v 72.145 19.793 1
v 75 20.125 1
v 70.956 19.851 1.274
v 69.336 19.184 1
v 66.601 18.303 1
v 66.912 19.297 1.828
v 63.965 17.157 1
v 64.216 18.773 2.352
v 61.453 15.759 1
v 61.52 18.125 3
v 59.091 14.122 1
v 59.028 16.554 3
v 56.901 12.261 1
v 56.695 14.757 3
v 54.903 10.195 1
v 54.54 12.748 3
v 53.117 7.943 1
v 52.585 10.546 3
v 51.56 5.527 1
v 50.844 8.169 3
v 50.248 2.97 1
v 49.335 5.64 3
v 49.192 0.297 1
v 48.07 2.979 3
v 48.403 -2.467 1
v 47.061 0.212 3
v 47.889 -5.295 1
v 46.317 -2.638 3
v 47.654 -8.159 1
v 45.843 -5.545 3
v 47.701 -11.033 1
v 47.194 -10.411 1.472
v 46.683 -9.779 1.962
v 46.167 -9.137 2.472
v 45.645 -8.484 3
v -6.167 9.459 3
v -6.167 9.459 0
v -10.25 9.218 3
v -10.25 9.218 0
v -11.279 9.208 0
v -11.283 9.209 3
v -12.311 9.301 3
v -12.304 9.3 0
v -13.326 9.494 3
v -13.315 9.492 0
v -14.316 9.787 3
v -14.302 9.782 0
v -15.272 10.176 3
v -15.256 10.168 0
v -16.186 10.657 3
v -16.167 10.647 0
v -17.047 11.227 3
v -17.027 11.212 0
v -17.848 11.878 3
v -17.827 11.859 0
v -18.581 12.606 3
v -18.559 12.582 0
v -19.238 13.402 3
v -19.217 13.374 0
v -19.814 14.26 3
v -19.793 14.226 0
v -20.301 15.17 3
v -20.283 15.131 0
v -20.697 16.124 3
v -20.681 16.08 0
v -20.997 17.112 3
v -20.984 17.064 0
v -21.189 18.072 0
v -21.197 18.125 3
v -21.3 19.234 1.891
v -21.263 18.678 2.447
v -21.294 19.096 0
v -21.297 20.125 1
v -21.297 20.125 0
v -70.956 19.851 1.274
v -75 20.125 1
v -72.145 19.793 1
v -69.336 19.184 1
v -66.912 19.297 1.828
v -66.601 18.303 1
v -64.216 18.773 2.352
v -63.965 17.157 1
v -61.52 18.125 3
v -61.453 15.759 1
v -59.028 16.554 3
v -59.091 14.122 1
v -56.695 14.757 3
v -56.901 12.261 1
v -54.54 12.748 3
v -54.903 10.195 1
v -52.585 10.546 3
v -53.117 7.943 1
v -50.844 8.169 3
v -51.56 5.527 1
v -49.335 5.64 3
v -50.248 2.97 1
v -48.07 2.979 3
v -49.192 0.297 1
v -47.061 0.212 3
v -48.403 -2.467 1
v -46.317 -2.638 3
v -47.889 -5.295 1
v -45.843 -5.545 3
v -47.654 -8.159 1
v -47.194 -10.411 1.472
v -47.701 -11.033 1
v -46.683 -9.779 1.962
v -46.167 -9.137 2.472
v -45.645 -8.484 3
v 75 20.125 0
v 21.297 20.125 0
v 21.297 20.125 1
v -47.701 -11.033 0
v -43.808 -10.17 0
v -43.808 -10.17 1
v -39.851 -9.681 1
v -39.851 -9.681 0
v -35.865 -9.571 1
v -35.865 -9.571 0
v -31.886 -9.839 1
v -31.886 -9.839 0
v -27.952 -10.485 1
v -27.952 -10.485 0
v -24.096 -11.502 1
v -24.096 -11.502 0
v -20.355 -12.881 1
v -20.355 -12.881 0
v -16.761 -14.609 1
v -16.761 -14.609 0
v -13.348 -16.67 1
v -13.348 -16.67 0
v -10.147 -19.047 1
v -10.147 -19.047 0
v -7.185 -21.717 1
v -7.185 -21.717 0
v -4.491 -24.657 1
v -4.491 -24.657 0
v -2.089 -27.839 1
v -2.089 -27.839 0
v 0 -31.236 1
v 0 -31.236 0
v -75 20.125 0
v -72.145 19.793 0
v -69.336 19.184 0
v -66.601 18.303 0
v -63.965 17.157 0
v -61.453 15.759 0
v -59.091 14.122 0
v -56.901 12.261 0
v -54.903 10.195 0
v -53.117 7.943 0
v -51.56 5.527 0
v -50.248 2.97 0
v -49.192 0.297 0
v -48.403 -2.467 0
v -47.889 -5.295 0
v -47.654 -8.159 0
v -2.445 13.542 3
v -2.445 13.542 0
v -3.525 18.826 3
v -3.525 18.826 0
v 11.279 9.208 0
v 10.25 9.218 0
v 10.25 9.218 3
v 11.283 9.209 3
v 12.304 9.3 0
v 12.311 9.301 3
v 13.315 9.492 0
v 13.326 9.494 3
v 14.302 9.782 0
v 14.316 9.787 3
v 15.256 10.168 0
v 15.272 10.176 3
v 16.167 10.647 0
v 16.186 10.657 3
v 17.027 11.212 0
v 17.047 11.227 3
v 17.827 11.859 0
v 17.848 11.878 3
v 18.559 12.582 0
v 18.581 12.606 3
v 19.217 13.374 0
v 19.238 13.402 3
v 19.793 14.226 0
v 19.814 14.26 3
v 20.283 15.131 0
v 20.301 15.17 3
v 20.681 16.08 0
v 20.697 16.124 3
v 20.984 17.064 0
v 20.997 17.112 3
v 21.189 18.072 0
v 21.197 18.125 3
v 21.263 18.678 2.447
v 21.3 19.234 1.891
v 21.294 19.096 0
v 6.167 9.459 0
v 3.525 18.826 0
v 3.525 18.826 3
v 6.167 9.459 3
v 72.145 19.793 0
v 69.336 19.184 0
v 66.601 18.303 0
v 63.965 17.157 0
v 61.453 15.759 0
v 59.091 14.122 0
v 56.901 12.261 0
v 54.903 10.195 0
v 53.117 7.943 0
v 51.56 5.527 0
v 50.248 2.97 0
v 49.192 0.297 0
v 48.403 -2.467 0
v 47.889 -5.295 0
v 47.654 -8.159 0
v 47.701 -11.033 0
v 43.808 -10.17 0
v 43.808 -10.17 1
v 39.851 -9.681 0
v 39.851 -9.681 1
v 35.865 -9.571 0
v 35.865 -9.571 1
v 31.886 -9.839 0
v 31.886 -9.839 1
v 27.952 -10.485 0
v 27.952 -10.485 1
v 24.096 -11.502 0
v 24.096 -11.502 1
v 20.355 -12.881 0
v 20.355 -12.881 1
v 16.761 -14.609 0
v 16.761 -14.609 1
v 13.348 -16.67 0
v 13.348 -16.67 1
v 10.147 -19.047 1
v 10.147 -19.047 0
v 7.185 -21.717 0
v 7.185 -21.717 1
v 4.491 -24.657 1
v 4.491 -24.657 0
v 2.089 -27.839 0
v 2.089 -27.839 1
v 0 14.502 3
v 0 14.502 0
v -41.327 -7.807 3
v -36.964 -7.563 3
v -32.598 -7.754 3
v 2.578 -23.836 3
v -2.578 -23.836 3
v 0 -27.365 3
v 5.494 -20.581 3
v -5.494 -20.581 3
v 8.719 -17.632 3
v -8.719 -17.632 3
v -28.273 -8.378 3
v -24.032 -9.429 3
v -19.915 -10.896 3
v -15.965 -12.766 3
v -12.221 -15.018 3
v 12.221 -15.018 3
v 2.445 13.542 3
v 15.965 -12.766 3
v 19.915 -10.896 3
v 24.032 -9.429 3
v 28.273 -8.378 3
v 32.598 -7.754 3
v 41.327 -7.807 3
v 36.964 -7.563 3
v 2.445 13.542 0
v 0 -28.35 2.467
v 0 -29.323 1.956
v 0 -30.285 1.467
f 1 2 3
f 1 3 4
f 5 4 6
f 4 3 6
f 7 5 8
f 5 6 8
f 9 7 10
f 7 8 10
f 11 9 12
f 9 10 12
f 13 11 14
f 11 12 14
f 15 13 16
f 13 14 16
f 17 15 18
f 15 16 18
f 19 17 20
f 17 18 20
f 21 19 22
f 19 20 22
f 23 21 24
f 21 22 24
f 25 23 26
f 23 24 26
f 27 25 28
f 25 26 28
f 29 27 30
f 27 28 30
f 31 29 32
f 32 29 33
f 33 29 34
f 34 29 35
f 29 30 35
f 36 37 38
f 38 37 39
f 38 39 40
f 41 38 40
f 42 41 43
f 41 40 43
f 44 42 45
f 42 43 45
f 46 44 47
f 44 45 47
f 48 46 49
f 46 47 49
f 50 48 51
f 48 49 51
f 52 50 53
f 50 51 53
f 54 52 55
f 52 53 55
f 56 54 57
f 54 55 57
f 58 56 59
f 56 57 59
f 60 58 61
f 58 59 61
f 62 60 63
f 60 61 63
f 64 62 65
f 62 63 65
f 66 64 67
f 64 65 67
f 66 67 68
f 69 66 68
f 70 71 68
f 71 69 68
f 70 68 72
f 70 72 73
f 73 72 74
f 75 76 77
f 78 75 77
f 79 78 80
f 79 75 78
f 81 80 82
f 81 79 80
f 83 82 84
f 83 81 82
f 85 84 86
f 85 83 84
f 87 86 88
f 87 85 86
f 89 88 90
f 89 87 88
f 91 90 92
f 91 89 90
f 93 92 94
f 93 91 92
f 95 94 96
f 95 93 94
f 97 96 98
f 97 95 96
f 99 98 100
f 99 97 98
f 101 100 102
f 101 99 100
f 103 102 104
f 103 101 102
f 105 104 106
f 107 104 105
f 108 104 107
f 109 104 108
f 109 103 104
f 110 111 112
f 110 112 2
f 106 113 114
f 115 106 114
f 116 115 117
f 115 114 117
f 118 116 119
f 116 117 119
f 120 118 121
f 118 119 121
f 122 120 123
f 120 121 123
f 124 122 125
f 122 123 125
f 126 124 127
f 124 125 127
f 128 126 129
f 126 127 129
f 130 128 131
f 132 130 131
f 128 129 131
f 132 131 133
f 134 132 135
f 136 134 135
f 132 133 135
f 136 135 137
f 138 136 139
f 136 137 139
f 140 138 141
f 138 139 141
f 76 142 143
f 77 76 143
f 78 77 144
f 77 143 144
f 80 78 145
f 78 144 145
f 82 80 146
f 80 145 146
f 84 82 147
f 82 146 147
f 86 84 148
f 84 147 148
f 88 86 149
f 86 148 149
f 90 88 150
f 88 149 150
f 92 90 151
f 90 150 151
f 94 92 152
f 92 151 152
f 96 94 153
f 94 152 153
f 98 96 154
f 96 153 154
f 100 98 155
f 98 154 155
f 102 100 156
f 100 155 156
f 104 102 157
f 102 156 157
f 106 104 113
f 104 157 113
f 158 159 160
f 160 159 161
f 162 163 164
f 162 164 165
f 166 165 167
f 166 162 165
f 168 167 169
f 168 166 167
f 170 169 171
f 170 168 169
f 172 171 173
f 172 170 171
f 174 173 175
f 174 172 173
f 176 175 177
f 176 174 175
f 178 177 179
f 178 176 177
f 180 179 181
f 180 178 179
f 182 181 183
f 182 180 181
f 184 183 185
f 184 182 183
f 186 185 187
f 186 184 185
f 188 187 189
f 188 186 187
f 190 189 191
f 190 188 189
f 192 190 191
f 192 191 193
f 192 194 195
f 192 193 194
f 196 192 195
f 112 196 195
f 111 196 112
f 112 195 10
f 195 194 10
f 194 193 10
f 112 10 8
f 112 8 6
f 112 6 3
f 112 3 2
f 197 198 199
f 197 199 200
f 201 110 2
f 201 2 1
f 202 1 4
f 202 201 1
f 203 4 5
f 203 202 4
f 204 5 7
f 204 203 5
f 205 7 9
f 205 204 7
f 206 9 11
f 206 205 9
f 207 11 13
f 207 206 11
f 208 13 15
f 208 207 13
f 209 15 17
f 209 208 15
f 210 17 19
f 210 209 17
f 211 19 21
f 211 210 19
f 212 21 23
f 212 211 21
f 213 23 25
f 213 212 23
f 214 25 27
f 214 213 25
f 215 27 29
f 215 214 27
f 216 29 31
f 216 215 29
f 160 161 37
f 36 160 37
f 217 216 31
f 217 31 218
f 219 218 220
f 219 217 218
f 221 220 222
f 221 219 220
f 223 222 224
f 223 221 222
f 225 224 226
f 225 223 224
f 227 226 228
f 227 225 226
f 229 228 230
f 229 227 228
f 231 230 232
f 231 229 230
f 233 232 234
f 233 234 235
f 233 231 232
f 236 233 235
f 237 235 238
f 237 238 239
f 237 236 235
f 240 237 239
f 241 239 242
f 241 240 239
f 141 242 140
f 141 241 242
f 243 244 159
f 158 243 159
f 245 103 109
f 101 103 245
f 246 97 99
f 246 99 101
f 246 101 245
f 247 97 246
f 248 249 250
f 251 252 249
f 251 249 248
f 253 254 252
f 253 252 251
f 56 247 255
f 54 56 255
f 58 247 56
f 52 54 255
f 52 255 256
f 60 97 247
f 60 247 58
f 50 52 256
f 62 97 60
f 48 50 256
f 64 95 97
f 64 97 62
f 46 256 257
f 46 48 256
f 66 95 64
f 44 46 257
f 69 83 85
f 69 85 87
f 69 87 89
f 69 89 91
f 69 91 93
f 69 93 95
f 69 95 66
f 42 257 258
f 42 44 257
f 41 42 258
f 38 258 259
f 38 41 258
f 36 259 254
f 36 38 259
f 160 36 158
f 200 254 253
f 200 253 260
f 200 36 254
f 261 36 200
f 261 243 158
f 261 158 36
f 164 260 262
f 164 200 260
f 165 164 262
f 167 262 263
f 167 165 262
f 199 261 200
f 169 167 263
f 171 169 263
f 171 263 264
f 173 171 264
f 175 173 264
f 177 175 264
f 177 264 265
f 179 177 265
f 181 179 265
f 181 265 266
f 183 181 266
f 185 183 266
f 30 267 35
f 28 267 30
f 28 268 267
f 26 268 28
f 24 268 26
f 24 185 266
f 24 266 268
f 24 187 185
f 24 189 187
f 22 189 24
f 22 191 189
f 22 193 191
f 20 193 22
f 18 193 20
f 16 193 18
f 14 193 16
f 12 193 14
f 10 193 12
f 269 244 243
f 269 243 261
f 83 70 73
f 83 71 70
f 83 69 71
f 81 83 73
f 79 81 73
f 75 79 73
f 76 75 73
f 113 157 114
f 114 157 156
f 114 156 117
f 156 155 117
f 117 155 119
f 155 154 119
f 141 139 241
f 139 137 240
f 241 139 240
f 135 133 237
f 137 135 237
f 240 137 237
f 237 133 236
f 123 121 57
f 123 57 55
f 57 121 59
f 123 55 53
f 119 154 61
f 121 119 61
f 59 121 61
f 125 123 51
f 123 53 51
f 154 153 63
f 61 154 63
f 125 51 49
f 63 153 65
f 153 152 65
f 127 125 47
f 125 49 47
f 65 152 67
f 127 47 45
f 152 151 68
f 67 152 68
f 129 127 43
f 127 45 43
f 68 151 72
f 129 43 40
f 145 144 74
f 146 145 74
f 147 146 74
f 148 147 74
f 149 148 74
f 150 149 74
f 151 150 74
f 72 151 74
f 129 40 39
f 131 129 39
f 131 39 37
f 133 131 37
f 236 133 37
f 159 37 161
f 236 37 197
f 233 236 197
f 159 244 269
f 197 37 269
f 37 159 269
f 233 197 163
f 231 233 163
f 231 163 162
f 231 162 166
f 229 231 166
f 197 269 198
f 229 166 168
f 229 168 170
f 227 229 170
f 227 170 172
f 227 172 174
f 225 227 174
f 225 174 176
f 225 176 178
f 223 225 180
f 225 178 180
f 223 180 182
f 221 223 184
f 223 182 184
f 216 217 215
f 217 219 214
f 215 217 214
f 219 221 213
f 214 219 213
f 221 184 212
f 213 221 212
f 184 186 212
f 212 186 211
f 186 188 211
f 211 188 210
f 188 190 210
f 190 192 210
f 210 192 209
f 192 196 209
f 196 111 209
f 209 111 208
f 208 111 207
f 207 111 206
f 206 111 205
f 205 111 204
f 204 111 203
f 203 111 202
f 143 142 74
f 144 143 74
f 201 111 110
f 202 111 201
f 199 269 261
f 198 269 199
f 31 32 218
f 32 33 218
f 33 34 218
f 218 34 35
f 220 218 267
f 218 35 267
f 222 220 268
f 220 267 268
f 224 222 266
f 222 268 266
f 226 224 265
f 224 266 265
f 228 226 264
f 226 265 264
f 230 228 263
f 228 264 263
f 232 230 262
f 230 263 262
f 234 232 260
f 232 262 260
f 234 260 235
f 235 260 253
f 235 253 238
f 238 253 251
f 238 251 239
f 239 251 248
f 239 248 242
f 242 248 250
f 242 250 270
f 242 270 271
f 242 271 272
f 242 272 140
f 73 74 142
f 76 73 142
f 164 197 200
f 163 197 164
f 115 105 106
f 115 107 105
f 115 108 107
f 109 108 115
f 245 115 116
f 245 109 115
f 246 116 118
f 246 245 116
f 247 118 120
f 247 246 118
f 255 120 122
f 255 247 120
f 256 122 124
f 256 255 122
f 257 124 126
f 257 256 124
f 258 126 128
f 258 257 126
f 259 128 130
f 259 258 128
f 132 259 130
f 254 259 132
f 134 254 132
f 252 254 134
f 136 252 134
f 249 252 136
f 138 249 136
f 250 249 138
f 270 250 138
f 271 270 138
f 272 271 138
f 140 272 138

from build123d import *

# Parameters (mm, degrees)
PAD_DEPTH    = 3
CHAMFER_SIZE = 2


with BuildPart() as body:
    # Sketch → Pad (new body)
    with BuildSketch(Plane.XY):
        with BuildLine():
            Line((0, 0), (0, 14.502488))
            Line((0, 14.502488), (2.444644, 13.541802))
            Line((2.444644, 13.541802), (3.525413, 18.825575))
            Line((3.525413, 18.825575), (6.167308, 9.459041))
            Line((6.167308, 9.459041), (10.250262, 9.218303))
            ThreePointArc((10.250262, 9.218303), (18.202038, 12.211905), (21.296978, 20.124789))
            Line((21.296978, 20.124789), (75, 20.124789))
            ThreePointArc((75, 20.124789), (54.90279, 10.195186), (47.700768, -11.032761))
            ThreePointArc((47.700768, -11.032761), (20.35465, -12.880568), (0, -31.235753))
            Line((0, -31.235753), (0, 0))
        make_face()
    extrude(amount=PAD_DEPTH)

    # Chamfer
    chamfer_edges = [body.edges().sort_by_distance(p)[0] for p in [
        (20.35465, -12.880568, 3),
        (54.90279, 10.195186, 3),
        (48.148489, 20.124789, 3),
    ]]
    chamfer(chamfer_edges, length=CHAMFER_SIZE)


with BuildPart() as part_mirroring:
    # Part__Mirroring: instance of Body
    add(body.part.mirror(Plane(origin=(0, 0, 0), x_dir=(0, -1, 0), z_dir=(1, 0, 0))))


with BuildPart() as fusion:
    # Fusion base: copy of Body
    add(body.part)

    # Fusion: union Part__Mirroring
    add(part_mirroring.part)


solid = fusion.part
